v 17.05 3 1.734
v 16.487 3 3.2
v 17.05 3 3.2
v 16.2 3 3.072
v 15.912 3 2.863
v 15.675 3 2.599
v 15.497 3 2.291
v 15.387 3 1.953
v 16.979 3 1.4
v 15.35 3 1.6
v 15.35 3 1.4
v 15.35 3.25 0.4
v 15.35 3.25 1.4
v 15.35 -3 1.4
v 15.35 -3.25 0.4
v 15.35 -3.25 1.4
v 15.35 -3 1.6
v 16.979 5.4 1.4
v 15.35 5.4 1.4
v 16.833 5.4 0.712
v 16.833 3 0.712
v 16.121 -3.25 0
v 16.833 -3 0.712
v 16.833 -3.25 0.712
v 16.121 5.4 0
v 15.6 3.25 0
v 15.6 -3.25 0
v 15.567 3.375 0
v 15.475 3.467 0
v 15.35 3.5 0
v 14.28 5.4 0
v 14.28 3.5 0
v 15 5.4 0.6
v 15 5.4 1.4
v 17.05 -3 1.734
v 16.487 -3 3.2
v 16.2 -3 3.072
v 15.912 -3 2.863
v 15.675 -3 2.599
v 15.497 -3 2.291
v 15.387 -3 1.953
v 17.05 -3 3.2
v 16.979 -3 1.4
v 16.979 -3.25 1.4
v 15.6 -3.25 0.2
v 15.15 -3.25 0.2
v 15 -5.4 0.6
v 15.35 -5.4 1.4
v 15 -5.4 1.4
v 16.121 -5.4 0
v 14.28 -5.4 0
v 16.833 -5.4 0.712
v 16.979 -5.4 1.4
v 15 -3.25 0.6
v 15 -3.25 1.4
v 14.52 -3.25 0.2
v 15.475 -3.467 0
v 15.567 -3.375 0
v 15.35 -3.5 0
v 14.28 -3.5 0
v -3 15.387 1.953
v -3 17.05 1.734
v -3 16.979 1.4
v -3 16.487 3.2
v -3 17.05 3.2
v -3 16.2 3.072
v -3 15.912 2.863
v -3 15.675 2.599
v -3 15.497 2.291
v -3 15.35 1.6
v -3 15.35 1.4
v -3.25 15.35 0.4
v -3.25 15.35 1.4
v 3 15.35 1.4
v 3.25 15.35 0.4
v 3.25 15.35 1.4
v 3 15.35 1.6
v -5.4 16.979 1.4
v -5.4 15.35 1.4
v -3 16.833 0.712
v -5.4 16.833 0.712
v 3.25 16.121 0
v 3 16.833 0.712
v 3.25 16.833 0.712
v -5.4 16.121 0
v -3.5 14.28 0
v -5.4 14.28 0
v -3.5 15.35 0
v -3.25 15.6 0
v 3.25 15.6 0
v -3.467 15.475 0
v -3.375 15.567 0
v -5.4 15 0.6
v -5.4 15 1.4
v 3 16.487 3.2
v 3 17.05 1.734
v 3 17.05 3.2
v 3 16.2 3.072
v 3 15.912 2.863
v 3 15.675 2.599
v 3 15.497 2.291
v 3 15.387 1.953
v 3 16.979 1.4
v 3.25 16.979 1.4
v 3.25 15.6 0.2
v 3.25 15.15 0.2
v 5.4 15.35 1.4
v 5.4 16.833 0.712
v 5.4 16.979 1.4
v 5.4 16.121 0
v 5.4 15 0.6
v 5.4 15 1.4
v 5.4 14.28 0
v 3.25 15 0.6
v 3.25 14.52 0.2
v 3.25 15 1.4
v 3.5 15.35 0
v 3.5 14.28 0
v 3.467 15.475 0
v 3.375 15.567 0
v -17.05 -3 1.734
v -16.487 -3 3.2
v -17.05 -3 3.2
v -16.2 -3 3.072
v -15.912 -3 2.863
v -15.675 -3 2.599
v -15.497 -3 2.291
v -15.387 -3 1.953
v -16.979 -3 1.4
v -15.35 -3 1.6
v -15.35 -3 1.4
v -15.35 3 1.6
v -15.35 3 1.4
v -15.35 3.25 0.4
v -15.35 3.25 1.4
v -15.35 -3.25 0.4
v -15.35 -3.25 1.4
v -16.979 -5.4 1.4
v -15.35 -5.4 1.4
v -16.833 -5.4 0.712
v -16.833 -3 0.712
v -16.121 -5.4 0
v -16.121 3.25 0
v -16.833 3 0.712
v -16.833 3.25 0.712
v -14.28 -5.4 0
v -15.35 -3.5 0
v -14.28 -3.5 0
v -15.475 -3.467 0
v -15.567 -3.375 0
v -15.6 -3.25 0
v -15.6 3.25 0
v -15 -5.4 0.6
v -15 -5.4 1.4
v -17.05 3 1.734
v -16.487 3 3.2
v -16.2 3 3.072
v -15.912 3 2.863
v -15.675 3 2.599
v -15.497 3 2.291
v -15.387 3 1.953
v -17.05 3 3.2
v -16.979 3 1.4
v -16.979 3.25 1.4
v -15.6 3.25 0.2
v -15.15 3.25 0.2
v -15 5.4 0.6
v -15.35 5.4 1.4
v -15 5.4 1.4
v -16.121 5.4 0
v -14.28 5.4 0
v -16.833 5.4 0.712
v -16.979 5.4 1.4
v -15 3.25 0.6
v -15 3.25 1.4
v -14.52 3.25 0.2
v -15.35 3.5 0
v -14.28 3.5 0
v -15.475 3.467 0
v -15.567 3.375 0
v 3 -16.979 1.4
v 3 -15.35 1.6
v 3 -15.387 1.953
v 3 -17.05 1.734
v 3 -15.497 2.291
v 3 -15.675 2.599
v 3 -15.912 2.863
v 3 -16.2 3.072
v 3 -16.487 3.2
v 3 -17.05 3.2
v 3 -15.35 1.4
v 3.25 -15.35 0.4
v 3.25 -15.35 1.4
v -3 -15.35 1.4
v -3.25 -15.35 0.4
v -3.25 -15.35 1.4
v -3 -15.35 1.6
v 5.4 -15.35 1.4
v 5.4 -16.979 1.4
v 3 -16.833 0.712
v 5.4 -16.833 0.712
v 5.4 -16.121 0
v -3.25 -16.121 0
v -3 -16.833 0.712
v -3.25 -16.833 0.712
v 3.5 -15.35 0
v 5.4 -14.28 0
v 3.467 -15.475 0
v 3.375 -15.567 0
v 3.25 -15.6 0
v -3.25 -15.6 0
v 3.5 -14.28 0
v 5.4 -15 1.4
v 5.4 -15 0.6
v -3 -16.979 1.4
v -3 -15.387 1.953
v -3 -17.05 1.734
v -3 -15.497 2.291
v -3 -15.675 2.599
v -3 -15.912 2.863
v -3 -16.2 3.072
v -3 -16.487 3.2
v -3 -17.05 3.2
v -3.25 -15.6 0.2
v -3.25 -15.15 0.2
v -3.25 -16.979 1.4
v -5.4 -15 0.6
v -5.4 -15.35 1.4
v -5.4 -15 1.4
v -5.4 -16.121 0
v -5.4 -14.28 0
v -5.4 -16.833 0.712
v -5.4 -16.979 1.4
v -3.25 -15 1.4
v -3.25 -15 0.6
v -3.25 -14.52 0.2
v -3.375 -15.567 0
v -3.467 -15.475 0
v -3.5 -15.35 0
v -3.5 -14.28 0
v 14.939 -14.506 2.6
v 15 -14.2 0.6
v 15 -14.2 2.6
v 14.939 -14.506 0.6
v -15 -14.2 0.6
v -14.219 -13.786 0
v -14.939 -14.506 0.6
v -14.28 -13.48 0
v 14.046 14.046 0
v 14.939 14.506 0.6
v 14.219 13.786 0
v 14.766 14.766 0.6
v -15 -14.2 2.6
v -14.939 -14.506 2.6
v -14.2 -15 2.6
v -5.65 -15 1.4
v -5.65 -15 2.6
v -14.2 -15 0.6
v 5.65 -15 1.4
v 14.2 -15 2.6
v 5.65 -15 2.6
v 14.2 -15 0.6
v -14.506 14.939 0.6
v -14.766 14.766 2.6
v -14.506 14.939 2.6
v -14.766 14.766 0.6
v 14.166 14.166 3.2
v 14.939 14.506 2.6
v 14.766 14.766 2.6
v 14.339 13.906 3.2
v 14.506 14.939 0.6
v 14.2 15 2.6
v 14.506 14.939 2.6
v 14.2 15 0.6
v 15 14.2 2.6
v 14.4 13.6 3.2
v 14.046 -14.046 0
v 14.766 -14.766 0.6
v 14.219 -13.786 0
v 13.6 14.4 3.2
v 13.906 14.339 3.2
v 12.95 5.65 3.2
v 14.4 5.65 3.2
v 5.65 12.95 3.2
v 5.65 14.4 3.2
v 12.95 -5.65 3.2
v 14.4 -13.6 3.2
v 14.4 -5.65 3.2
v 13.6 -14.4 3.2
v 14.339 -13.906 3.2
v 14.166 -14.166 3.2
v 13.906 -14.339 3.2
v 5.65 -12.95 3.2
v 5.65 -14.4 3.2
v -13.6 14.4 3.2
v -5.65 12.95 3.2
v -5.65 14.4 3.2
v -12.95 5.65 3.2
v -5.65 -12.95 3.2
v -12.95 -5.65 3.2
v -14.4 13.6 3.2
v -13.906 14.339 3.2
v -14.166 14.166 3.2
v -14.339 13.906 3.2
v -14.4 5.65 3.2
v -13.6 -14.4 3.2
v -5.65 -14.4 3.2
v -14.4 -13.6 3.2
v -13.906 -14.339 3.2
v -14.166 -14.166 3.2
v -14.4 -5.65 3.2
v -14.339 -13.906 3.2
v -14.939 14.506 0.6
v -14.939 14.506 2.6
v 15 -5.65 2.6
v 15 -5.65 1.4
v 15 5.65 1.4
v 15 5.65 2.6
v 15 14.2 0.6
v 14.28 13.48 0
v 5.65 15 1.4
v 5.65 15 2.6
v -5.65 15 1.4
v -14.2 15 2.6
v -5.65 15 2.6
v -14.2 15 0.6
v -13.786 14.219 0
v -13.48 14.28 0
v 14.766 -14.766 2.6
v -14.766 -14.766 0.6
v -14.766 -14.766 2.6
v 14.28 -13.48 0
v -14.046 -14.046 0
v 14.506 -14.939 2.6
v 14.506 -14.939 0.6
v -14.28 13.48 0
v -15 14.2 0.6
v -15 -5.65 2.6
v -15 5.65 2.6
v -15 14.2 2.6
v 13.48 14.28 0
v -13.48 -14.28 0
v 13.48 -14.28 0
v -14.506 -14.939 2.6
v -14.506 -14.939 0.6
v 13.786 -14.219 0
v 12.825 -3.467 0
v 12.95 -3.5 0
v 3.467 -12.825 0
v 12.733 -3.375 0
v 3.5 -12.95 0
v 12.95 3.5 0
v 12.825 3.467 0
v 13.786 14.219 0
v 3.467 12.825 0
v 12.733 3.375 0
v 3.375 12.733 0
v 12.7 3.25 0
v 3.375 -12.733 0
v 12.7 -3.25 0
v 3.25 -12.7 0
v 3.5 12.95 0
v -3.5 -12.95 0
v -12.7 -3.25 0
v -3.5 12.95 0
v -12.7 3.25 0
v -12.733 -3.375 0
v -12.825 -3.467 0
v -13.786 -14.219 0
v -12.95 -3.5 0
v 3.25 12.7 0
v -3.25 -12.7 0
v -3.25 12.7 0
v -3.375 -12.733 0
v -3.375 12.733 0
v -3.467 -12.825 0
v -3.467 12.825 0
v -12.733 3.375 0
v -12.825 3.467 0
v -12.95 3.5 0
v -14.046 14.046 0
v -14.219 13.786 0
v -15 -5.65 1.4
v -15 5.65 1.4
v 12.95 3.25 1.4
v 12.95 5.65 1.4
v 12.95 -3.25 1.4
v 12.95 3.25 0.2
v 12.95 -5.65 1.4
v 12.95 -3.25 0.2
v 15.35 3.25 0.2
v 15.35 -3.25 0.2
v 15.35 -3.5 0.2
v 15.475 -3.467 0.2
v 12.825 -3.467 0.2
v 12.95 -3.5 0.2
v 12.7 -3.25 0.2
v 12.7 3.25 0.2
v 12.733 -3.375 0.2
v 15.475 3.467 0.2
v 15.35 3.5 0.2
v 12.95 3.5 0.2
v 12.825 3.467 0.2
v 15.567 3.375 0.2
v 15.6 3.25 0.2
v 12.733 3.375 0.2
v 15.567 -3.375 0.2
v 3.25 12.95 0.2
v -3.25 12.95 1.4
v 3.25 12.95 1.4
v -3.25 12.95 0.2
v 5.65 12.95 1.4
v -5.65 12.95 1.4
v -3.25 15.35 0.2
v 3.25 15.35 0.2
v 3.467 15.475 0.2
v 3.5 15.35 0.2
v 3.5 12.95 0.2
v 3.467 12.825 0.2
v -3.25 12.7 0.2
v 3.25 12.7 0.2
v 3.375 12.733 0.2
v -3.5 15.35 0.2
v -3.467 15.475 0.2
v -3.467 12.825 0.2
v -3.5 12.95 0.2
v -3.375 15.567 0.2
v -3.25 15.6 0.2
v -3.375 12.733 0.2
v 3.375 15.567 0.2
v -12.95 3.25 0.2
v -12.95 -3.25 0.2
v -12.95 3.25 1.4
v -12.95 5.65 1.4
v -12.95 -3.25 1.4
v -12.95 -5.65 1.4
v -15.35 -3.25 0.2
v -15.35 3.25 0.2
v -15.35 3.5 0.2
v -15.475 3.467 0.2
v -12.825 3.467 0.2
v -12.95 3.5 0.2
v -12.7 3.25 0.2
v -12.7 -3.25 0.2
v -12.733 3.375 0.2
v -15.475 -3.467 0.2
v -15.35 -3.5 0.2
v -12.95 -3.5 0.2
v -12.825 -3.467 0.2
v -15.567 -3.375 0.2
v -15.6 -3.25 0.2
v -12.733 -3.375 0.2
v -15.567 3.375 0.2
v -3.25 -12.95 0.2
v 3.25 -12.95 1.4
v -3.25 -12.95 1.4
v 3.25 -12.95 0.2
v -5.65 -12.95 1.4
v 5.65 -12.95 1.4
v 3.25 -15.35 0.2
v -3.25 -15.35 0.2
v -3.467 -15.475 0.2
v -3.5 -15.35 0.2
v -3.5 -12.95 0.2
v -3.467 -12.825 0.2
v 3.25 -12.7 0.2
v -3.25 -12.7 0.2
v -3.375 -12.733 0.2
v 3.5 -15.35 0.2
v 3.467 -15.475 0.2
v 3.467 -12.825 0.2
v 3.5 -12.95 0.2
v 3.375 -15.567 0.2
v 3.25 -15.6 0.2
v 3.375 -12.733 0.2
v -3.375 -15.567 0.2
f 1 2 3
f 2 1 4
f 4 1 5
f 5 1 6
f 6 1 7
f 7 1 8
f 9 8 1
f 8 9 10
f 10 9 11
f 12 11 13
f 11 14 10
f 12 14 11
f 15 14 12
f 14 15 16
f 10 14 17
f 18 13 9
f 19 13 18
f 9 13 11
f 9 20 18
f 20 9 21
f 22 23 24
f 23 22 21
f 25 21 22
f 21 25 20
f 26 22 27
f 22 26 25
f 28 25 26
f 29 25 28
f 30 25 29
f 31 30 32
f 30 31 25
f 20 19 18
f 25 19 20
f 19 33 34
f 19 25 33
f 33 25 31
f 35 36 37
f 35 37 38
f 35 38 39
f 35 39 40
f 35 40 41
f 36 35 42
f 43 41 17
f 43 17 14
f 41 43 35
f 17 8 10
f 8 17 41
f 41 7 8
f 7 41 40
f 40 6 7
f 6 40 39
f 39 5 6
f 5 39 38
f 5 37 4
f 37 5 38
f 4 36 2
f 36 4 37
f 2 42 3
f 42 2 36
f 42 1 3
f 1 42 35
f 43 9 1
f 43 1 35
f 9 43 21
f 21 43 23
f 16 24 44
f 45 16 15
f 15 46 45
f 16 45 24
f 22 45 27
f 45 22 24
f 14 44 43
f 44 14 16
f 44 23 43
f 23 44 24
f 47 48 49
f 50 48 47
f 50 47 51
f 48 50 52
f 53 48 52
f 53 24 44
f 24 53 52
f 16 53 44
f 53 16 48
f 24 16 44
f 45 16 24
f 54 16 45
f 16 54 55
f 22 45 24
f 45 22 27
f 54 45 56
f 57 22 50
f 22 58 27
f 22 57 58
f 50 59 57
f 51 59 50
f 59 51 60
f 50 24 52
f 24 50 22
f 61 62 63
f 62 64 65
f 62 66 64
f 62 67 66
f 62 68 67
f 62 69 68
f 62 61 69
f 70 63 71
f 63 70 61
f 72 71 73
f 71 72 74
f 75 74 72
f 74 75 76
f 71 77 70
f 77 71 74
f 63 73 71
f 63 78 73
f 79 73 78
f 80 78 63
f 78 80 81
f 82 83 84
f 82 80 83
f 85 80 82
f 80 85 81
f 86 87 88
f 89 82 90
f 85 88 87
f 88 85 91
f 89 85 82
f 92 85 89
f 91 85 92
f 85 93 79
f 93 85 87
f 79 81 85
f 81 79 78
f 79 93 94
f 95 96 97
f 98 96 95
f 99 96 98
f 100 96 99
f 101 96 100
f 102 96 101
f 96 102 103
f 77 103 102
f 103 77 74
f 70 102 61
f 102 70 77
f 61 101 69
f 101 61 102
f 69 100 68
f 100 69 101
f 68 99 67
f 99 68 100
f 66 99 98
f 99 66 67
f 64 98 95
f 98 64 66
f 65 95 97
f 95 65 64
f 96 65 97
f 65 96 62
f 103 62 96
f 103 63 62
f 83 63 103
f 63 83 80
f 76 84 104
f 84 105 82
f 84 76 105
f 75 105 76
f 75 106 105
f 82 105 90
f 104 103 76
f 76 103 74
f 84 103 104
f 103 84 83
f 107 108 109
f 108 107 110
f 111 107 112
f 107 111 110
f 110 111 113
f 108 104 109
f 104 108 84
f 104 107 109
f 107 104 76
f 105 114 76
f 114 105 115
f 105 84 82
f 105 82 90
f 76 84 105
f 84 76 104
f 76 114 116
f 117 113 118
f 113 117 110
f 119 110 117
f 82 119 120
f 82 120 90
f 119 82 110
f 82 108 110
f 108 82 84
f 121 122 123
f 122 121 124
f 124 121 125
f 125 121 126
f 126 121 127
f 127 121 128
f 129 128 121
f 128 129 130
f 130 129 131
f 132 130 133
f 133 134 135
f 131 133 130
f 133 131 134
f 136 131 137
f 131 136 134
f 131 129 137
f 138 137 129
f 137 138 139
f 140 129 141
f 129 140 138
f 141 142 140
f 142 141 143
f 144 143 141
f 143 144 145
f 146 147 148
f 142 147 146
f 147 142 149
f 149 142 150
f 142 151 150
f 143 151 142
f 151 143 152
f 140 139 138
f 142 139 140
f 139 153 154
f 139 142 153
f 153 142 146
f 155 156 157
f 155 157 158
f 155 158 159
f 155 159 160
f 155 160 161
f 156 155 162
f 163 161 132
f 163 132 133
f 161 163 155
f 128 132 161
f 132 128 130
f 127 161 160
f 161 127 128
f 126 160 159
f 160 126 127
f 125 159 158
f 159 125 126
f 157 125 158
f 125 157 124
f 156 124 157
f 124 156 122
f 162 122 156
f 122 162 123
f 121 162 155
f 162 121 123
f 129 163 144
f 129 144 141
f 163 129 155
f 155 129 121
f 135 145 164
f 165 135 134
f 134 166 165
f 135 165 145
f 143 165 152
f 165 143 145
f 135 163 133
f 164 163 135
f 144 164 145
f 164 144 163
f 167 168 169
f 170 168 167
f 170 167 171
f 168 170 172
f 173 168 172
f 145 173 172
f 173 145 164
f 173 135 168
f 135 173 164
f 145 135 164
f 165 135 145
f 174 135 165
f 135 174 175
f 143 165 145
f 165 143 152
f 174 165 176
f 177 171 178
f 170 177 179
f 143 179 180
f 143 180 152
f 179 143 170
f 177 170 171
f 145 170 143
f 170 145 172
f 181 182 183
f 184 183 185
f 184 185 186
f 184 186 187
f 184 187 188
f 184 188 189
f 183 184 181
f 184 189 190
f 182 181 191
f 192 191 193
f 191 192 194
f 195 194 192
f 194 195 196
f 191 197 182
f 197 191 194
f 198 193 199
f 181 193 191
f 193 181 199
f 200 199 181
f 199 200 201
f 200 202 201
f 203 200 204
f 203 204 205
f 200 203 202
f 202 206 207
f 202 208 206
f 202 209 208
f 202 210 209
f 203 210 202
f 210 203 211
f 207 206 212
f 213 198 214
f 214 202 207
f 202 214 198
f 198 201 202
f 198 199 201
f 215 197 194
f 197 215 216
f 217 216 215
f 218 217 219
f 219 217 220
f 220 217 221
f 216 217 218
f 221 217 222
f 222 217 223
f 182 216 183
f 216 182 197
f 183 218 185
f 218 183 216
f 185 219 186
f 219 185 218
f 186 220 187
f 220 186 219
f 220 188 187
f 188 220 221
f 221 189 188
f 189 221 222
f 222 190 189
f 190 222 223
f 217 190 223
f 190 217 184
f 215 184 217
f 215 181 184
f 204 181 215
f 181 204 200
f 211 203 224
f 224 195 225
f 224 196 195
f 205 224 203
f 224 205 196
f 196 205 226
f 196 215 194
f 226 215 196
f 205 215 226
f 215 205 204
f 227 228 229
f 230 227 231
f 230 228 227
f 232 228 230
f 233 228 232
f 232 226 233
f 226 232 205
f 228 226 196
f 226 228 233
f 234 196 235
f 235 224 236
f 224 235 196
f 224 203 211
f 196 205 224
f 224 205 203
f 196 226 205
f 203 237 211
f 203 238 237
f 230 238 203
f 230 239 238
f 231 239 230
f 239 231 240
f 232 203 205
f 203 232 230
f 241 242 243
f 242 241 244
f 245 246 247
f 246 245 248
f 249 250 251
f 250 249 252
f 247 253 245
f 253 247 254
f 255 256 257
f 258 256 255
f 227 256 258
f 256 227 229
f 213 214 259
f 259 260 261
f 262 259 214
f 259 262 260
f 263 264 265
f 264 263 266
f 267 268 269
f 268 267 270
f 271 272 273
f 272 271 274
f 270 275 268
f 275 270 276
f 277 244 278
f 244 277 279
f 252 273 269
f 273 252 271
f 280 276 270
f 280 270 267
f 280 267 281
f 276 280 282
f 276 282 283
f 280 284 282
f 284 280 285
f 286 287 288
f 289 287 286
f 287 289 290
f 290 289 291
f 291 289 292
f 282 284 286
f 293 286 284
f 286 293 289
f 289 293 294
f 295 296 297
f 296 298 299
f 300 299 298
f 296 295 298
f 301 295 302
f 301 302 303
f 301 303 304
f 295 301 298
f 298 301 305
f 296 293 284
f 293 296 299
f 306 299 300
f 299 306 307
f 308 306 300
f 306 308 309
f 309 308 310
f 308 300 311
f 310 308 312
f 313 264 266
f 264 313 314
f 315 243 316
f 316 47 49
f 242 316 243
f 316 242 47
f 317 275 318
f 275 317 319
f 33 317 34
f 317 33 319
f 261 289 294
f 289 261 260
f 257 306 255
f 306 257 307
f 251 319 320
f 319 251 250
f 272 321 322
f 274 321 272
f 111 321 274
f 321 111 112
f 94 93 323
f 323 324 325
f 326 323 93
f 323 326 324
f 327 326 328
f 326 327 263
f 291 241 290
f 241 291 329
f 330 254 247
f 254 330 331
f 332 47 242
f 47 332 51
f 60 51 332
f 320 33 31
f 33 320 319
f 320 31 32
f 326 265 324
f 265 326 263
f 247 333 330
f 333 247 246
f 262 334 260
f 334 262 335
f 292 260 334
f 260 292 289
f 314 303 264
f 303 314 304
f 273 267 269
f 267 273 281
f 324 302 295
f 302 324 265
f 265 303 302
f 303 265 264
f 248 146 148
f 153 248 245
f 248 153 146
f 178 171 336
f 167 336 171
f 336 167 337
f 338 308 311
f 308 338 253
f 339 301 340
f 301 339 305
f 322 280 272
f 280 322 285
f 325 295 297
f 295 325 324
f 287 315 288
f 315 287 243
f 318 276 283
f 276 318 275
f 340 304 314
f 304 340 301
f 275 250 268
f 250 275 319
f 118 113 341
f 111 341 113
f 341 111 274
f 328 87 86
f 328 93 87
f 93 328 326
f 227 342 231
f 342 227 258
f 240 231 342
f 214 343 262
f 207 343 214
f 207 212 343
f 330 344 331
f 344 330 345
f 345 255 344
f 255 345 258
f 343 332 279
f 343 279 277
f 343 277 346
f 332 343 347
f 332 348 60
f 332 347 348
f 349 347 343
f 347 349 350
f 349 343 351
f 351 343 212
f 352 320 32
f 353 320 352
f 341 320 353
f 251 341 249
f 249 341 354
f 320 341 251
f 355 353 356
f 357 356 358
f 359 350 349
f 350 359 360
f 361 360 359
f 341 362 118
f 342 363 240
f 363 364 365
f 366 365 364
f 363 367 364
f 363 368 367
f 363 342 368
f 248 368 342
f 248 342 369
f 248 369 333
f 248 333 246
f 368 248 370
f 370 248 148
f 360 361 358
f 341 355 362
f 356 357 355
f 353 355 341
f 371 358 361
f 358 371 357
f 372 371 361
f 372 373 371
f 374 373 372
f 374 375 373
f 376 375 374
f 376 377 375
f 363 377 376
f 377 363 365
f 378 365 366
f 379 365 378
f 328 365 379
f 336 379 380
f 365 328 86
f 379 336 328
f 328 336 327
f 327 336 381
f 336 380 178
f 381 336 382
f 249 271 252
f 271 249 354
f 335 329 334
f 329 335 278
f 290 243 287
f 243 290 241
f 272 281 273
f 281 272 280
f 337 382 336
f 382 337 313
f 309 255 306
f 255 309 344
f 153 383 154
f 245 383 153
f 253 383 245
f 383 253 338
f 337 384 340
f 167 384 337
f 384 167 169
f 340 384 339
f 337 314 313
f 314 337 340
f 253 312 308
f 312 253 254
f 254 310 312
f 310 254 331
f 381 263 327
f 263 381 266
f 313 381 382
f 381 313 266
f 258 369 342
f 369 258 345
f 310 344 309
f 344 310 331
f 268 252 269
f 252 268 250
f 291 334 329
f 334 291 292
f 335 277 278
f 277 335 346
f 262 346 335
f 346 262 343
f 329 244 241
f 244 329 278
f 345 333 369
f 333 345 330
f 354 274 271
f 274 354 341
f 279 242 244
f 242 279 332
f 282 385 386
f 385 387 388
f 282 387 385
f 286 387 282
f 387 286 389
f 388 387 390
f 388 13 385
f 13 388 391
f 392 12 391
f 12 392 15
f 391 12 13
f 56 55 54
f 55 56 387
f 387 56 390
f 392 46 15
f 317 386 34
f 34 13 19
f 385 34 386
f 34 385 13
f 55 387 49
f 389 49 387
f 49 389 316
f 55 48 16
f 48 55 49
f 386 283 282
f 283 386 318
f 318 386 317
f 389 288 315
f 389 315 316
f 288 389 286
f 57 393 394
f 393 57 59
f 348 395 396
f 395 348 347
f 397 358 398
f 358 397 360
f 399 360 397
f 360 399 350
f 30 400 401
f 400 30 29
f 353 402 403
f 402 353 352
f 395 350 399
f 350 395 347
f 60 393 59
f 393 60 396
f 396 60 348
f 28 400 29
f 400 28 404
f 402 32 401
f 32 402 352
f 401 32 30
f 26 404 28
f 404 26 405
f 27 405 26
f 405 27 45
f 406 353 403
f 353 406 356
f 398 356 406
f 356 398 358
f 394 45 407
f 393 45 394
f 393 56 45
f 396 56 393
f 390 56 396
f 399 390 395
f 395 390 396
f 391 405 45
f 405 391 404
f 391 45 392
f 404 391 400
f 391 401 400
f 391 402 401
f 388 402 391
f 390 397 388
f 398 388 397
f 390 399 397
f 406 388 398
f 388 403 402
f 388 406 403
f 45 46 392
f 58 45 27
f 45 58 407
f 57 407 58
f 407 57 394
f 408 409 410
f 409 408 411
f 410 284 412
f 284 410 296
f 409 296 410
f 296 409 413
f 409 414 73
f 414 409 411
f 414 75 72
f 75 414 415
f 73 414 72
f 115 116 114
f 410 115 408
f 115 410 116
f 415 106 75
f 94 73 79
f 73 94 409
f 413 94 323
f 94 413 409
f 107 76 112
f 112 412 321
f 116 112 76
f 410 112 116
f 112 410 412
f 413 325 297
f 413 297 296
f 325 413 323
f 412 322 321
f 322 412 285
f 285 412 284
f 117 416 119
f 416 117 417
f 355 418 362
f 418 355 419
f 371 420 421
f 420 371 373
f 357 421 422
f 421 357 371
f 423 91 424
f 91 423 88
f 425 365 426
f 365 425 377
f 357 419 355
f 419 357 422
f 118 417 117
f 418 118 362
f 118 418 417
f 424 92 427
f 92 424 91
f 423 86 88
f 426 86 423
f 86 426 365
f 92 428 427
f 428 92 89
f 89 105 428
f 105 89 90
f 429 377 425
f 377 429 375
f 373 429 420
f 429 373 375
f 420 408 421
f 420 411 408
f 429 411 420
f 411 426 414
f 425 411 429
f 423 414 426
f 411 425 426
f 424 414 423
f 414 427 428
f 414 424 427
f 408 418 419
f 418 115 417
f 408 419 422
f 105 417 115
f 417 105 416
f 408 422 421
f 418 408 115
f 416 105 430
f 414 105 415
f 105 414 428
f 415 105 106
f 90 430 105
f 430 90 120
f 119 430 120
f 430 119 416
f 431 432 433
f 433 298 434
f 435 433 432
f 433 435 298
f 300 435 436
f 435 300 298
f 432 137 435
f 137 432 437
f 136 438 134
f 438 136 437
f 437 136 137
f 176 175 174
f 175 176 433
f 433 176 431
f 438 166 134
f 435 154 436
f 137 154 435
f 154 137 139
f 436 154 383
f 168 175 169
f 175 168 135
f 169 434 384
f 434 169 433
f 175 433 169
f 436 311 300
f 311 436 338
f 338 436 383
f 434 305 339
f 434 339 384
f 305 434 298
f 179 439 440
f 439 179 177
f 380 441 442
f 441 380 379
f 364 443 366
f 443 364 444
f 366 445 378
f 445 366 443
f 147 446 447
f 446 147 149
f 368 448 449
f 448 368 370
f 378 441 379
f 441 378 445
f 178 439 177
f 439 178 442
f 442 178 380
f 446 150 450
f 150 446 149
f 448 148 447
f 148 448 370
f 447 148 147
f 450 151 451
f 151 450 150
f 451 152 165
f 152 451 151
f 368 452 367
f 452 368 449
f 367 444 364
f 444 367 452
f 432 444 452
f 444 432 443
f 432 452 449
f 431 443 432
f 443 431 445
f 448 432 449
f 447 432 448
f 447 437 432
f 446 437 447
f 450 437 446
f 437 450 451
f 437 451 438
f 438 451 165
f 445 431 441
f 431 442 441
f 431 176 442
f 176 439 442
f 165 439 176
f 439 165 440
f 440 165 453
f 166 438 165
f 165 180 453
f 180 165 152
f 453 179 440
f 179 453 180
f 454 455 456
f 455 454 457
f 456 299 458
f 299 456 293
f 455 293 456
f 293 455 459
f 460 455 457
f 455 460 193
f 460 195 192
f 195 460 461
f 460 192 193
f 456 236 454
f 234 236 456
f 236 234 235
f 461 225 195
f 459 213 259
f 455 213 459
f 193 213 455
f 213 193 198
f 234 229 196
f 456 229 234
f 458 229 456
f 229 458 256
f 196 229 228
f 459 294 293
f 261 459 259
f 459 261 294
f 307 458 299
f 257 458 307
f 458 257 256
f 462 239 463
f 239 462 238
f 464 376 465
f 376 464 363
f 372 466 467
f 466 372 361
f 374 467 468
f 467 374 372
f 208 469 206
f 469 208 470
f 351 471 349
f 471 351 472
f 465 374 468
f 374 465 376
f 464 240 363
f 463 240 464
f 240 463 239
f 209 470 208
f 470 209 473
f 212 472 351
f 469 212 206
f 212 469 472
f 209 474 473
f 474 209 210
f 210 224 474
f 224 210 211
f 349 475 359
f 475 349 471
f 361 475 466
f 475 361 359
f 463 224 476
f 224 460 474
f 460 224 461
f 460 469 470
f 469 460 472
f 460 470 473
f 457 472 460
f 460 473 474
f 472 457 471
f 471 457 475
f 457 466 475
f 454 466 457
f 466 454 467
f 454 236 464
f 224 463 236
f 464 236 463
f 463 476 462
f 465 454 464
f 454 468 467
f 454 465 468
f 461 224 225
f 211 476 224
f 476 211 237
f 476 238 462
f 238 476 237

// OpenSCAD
side = 30;
height = 3.2;
hook_width = 1.7;
hook_protrusion_length = 6;
hook_arm_length = 2.4;

slack = 0.7;
side_loose = 0.5;

eps = 0.0001;

module stack(h) {
  linear_extrude(h) children(0);
  if ($children > 1)
    translate([0, 0, h]) children(1);
}

module hook_2d(fillet=true, protrude=true, arm=true) {
  $fn = 30;
  
  intersection() {
    square([hook_width, height]);
    
    // Gently rounded.
    translate([hook_width - 4.8, 0])
      rotate([0, 0, 12])
        square(10, center=true);
    
    // Elephant foot.
    translate([hook_width - 4.8, 0])
      rotate([0, 0, 45])
        square(10, center=true);
    
    // Chopped corner.
    hull() {
      translate([hook_width, hook_width-0.1])
        circle(hook_width);
      translate([0, 10])
        square(10);
    }
    
    if (!protrude)
      translate([0, height/2 + 0.2])
        square(10);
  }

  if (arm)
    translate([-hook_width, height/2 + 0.2])
      square([hook_width, height/2 - 0.2]);

  if (fillet) {
    hull() {
      translate([-0.2, height - 0.2])
        square([0.4, 0.2]);
      translate([0, height - 0.4])
        square([0.4, eps]);
    }
  }
}

module hook() {
  rotate([-90, 0, 0]) {
    translate([slack/2, -height, -hook_arm_length - hook_protrusion_length/2]) {
      stack(hook_arm_length - side_loose/2) {
        hook_2d(protrude=false);
        stack(side_loose/2) {
          hook_2d(protrude=false, arm=false);
          stack(hook_protrusion_length) {
            hook_2d(arm=false);
            stack(side_loose/2) {
              hook_2d(protrude=false, arm=false);
              stack(hook_arm_length - side_loose/2) {
                hook_2d(protrude=false);
              }
            }
          }
        }
      }
    }
  }
}

module hole() {
  translate([-hook_width/2, 0, 0]) {
    translate([0, 0, -1])
      linear_extrude(height+2)
        square([hook_width + slack, hook_protrusion_length + side_loose], center=true);
    
    translate([0, 0, height/2 - 0.2])
      linear_extrude(height+2)
        square([hook_width + slack, hook_protrusion_length + side_loose + 2*hook_arm_length], center=true);
    
    // Foot inside hole.
    translate([0, 0, -1])
      linear_extrude(1.2)
        offset(0.25, $fn=12)
          square([hook_width + slack, hook_protrusion_length + side_loose], center=true);
  }
}

module piece_2d(recede) {
  roundoff = 0.8;
  $fn = 16;

  offset(roundoff)
    offset(-roundoff-recede)
      square(side, center=true);
}

module piece_exterior() {
  chamfer = 0.6;
  hull() {
    translate([0, 0, height/2])
      linear_extrude(height/2)
        piece_2d(chamfer);
    
    // Slightly stronger chamfer on bottom.
    linear_extrude(height/2)
      piece_2d(chamfer*1.2);

    translate([0, 0, chamfer])
      linear_extrude(height - 2*chamfer)
        piece_2d(0);
  }
}

module piece() {
  difference() {
    union() {
      piece_exterior();
      
      for (a = [0:3])
        rotate([0, 0, a*90])
          translate([side/2, 0, 0])
            hook();
    }
    
    for (a = [0:3])
      rotate([0, 0, a*90])
        translate([side/2, 0, 0])
          hole();
  }
}

piece();
